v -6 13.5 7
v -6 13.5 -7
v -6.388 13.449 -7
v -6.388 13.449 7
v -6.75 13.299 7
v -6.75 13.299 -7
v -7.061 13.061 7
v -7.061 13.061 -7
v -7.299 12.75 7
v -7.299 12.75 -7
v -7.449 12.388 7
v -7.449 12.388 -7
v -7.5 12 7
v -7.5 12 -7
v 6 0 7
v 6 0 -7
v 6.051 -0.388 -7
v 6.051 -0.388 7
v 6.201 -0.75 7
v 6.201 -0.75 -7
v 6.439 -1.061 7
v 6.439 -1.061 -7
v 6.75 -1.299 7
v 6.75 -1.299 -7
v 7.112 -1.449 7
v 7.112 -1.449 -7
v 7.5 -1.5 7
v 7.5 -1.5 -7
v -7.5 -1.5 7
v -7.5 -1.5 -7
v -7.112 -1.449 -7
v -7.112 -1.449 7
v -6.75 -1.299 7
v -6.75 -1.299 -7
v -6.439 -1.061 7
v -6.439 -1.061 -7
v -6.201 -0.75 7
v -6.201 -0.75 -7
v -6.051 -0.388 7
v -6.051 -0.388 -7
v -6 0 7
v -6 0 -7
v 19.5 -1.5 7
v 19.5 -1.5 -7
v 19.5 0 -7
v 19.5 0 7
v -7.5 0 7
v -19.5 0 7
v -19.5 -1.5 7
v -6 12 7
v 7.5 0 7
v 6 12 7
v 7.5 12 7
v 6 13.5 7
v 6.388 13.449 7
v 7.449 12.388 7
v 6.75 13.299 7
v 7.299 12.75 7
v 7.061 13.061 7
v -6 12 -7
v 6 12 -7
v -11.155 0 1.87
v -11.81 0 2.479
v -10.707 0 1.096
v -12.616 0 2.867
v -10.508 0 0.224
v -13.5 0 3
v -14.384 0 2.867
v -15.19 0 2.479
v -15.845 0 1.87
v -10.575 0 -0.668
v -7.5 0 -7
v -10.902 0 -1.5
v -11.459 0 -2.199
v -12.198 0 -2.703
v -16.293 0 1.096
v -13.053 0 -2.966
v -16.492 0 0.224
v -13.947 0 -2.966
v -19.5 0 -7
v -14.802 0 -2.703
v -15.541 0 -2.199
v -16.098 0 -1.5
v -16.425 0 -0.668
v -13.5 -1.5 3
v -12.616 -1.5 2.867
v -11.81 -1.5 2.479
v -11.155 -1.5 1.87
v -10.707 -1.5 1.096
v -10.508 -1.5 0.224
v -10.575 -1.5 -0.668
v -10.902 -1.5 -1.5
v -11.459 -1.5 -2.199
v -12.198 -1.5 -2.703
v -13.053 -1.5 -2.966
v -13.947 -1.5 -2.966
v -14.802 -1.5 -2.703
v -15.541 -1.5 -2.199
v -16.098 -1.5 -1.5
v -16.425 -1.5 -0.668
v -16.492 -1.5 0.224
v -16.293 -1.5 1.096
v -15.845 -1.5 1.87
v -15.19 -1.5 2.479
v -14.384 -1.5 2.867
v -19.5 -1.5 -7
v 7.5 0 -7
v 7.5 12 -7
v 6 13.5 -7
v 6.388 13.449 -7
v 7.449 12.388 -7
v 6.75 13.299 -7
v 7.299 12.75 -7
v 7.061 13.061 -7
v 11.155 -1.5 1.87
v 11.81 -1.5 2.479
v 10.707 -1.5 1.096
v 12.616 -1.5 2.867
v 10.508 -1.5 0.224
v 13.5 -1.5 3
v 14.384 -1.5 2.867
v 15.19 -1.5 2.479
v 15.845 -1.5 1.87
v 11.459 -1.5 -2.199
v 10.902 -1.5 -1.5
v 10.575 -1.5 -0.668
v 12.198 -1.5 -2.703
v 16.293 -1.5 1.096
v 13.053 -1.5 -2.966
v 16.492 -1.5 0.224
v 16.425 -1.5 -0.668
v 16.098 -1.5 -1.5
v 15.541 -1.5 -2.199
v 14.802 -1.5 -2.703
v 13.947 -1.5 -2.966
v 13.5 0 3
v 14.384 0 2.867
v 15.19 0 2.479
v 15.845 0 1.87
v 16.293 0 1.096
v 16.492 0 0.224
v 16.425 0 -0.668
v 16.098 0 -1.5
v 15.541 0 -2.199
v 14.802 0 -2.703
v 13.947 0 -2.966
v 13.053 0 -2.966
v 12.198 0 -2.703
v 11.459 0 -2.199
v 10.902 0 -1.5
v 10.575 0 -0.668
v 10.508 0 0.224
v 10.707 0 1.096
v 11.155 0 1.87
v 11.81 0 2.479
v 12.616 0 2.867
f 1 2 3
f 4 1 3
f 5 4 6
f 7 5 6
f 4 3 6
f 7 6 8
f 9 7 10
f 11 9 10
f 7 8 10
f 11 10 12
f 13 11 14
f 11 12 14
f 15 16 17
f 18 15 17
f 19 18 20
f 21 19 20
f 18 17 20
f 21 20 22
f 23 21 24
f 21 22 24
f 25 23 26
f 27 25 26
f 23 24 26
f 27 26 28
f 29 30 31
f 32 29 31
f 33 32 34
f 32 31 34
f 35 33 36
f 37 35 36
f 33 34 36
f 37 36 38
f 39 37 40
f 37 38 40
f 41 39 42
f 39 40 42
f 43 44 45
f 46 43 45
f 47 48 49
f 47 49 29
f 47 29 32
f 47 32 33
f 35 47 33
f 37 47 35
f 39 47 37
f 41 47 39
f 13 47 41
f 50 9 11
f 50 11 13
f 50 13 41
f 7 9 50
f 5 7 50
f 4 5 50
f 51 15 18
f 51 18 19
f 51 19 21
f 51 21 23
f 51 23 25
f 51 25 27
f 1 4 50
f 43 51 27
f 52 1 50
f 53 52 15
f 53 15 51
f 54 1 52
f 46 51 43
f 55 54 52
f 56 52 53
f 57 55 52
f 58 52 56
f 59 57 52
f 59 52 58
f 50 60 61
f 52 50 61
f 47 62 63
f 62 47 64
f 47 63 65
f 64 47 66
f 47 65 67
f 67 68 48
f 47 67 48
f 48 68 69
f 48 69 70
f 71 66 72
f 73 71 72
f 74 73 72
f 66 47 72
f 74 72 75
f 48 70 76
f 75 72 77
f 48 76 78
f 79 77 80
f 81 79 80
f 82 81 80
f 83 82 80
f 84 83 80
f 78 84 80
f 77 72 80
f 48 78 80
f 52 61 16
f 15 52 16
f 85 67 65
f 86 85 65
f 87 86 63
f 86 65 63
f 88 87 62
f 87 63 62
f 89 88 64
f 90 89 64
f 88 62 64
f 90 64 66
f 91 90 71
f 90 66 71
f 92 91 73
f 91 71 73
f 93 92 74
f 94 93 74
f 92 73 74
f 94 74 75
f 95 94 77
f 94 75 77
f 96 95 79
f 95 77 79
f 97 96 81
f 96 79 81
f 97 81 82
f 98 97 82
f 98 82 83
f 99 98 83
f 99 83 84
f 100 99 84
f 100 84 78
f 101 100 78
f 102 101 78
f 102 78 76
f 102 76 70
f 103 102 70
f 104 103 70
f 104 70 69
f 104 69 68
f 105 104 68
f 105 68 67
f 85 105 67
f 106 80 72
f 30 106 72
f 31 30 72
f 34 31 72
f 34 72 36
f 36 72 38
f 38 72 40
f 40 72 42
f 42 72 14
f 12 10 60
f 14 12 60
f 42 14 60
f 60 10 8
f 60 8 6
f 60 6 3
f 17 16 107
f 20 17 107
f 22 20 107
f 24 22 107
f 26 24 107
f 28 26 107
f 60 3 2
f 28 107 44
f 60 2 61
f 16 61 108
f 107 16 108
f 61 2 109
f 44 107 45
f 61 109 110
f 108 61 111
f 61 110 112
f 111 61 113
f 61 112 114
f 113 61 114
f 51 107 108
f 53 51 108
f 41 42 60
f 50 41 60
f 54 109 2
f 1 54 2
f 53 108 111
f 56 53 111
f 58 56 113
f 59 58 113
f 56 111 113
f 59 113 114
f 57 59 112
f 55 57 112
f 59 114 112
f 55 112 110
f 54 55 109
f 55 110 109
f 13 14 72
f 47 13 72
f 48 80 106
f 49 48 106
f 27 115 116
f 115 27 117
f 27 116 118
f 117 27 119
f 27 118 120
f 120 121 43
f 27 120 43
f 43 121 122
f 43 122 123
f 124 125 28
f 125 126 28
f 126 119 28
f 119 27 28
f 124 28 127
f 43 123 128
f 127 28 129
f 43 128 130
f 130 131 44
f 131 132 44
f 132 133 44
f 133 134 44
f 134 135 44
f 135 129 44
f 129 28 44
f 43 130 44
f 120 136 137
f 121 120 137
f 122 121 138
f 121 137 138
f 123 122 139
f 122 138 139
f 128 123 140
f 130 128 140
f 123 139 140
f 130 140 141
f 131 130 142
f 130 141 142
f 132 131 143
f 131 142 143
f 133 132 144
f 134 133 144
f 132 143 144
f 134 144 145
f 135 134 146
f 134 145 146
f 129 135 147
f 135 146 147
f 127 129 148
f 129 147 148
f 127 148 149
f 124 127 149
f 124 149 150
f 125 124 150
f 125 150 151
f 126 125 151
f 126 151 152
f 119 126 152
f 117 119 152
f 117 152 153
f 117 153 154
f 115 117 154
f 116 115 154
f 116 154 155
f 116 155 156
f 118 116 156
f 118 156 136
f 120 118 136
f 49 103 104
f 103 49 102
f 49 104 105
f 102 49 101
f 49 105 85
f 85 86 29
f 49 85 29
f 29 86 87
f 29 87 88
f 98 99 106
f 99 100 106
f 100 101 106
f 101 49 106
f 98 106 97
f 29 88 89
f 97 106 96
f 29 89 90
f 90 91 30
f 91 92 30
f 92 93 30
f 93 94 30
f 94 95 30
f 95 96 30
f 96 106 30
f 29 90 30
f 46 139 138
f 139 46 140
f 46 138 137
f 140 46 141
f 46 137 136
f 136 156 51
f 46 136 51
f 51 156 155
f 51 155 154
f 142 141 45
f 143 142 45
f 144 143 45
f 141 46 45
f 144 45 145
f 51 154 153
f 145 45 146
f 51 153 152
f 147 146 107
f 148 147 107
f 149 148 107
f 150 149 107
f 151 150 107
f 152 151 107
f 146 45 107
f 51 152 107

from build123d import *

# Parameters (mm, degrees)
SM_START               = -7
SM_BASE_FLANGE_1_DEPTH = 14
SKETCH_6_R             = 3
CUT_EXTRUDE_1_DEPTH    = 10


# Read off the part's stored shape, not the designer's step: 基体-法兰1
with BuildPart() as part:
    # 基体-法兰1 outline → 基体-法兰1 (new body)
    with BuildSketch(Plane.XY.offset(SM_START)):
        with BuildLine():
            Line((7.5, -1.5), (19.5, -1.5))
            Line((19.5, -1.5), (19.5, 0))
            Line((19.5, 0), (7.5, 0))
            Line((7.5, 0), (7.5, 12))
            ThreePointArc((7.5, 12), (7.060660172, 13.060660172), (6, 13.5))
            Line((6, 13.5), (-6, 13.5))
            ThreePointArc((-6, 13.5), (-7.060660172, 13.060660172), (-7.5, 12))
            Line((-7.5, 12), (-7.5, 0))
            Line((-7.5, 0), (-19.5, 0))
            Line((-19.5, 0), (-19.5, -1.5))
            Line((-19.5, -1.5), (-7.5, -1.5))
            ThreePointArc((-7.5, -1.5), (-6.439339828, -1.060660172), (-6, 0))
            Line((-6, 0), (-6, 12))
            Line((-6, 12), (6, 12))
            Line((6, 12), (6, 0))
            ThreePointArc((6, 0), (6.439339828, -1.060660172), (7.5, -1.5))
        make_face()
    extrude(amount=SM_BASE_FLANGE_1_DEPTH)

    # 草图6 → 切除-拉伸1 (cut)
    with BuildSketch(Plane(origin=(0, 0, 0), x_dir=(1, 0, 0), z_dir=(0, 1, 0))):
        with Locations(Location((-13.5, 0, 0), (0, 0, 270))):
            Circle(SKETCH_6_R)
        with Locations(Location((13.5, 0, 0), (0, 0, 270))):
            Circle(SKETCH_6_R)
    extrude(amount=-CUT_EXTRUDE_1_DEPTH, mode=Mode.SUBTRACT)


solid = part.part
